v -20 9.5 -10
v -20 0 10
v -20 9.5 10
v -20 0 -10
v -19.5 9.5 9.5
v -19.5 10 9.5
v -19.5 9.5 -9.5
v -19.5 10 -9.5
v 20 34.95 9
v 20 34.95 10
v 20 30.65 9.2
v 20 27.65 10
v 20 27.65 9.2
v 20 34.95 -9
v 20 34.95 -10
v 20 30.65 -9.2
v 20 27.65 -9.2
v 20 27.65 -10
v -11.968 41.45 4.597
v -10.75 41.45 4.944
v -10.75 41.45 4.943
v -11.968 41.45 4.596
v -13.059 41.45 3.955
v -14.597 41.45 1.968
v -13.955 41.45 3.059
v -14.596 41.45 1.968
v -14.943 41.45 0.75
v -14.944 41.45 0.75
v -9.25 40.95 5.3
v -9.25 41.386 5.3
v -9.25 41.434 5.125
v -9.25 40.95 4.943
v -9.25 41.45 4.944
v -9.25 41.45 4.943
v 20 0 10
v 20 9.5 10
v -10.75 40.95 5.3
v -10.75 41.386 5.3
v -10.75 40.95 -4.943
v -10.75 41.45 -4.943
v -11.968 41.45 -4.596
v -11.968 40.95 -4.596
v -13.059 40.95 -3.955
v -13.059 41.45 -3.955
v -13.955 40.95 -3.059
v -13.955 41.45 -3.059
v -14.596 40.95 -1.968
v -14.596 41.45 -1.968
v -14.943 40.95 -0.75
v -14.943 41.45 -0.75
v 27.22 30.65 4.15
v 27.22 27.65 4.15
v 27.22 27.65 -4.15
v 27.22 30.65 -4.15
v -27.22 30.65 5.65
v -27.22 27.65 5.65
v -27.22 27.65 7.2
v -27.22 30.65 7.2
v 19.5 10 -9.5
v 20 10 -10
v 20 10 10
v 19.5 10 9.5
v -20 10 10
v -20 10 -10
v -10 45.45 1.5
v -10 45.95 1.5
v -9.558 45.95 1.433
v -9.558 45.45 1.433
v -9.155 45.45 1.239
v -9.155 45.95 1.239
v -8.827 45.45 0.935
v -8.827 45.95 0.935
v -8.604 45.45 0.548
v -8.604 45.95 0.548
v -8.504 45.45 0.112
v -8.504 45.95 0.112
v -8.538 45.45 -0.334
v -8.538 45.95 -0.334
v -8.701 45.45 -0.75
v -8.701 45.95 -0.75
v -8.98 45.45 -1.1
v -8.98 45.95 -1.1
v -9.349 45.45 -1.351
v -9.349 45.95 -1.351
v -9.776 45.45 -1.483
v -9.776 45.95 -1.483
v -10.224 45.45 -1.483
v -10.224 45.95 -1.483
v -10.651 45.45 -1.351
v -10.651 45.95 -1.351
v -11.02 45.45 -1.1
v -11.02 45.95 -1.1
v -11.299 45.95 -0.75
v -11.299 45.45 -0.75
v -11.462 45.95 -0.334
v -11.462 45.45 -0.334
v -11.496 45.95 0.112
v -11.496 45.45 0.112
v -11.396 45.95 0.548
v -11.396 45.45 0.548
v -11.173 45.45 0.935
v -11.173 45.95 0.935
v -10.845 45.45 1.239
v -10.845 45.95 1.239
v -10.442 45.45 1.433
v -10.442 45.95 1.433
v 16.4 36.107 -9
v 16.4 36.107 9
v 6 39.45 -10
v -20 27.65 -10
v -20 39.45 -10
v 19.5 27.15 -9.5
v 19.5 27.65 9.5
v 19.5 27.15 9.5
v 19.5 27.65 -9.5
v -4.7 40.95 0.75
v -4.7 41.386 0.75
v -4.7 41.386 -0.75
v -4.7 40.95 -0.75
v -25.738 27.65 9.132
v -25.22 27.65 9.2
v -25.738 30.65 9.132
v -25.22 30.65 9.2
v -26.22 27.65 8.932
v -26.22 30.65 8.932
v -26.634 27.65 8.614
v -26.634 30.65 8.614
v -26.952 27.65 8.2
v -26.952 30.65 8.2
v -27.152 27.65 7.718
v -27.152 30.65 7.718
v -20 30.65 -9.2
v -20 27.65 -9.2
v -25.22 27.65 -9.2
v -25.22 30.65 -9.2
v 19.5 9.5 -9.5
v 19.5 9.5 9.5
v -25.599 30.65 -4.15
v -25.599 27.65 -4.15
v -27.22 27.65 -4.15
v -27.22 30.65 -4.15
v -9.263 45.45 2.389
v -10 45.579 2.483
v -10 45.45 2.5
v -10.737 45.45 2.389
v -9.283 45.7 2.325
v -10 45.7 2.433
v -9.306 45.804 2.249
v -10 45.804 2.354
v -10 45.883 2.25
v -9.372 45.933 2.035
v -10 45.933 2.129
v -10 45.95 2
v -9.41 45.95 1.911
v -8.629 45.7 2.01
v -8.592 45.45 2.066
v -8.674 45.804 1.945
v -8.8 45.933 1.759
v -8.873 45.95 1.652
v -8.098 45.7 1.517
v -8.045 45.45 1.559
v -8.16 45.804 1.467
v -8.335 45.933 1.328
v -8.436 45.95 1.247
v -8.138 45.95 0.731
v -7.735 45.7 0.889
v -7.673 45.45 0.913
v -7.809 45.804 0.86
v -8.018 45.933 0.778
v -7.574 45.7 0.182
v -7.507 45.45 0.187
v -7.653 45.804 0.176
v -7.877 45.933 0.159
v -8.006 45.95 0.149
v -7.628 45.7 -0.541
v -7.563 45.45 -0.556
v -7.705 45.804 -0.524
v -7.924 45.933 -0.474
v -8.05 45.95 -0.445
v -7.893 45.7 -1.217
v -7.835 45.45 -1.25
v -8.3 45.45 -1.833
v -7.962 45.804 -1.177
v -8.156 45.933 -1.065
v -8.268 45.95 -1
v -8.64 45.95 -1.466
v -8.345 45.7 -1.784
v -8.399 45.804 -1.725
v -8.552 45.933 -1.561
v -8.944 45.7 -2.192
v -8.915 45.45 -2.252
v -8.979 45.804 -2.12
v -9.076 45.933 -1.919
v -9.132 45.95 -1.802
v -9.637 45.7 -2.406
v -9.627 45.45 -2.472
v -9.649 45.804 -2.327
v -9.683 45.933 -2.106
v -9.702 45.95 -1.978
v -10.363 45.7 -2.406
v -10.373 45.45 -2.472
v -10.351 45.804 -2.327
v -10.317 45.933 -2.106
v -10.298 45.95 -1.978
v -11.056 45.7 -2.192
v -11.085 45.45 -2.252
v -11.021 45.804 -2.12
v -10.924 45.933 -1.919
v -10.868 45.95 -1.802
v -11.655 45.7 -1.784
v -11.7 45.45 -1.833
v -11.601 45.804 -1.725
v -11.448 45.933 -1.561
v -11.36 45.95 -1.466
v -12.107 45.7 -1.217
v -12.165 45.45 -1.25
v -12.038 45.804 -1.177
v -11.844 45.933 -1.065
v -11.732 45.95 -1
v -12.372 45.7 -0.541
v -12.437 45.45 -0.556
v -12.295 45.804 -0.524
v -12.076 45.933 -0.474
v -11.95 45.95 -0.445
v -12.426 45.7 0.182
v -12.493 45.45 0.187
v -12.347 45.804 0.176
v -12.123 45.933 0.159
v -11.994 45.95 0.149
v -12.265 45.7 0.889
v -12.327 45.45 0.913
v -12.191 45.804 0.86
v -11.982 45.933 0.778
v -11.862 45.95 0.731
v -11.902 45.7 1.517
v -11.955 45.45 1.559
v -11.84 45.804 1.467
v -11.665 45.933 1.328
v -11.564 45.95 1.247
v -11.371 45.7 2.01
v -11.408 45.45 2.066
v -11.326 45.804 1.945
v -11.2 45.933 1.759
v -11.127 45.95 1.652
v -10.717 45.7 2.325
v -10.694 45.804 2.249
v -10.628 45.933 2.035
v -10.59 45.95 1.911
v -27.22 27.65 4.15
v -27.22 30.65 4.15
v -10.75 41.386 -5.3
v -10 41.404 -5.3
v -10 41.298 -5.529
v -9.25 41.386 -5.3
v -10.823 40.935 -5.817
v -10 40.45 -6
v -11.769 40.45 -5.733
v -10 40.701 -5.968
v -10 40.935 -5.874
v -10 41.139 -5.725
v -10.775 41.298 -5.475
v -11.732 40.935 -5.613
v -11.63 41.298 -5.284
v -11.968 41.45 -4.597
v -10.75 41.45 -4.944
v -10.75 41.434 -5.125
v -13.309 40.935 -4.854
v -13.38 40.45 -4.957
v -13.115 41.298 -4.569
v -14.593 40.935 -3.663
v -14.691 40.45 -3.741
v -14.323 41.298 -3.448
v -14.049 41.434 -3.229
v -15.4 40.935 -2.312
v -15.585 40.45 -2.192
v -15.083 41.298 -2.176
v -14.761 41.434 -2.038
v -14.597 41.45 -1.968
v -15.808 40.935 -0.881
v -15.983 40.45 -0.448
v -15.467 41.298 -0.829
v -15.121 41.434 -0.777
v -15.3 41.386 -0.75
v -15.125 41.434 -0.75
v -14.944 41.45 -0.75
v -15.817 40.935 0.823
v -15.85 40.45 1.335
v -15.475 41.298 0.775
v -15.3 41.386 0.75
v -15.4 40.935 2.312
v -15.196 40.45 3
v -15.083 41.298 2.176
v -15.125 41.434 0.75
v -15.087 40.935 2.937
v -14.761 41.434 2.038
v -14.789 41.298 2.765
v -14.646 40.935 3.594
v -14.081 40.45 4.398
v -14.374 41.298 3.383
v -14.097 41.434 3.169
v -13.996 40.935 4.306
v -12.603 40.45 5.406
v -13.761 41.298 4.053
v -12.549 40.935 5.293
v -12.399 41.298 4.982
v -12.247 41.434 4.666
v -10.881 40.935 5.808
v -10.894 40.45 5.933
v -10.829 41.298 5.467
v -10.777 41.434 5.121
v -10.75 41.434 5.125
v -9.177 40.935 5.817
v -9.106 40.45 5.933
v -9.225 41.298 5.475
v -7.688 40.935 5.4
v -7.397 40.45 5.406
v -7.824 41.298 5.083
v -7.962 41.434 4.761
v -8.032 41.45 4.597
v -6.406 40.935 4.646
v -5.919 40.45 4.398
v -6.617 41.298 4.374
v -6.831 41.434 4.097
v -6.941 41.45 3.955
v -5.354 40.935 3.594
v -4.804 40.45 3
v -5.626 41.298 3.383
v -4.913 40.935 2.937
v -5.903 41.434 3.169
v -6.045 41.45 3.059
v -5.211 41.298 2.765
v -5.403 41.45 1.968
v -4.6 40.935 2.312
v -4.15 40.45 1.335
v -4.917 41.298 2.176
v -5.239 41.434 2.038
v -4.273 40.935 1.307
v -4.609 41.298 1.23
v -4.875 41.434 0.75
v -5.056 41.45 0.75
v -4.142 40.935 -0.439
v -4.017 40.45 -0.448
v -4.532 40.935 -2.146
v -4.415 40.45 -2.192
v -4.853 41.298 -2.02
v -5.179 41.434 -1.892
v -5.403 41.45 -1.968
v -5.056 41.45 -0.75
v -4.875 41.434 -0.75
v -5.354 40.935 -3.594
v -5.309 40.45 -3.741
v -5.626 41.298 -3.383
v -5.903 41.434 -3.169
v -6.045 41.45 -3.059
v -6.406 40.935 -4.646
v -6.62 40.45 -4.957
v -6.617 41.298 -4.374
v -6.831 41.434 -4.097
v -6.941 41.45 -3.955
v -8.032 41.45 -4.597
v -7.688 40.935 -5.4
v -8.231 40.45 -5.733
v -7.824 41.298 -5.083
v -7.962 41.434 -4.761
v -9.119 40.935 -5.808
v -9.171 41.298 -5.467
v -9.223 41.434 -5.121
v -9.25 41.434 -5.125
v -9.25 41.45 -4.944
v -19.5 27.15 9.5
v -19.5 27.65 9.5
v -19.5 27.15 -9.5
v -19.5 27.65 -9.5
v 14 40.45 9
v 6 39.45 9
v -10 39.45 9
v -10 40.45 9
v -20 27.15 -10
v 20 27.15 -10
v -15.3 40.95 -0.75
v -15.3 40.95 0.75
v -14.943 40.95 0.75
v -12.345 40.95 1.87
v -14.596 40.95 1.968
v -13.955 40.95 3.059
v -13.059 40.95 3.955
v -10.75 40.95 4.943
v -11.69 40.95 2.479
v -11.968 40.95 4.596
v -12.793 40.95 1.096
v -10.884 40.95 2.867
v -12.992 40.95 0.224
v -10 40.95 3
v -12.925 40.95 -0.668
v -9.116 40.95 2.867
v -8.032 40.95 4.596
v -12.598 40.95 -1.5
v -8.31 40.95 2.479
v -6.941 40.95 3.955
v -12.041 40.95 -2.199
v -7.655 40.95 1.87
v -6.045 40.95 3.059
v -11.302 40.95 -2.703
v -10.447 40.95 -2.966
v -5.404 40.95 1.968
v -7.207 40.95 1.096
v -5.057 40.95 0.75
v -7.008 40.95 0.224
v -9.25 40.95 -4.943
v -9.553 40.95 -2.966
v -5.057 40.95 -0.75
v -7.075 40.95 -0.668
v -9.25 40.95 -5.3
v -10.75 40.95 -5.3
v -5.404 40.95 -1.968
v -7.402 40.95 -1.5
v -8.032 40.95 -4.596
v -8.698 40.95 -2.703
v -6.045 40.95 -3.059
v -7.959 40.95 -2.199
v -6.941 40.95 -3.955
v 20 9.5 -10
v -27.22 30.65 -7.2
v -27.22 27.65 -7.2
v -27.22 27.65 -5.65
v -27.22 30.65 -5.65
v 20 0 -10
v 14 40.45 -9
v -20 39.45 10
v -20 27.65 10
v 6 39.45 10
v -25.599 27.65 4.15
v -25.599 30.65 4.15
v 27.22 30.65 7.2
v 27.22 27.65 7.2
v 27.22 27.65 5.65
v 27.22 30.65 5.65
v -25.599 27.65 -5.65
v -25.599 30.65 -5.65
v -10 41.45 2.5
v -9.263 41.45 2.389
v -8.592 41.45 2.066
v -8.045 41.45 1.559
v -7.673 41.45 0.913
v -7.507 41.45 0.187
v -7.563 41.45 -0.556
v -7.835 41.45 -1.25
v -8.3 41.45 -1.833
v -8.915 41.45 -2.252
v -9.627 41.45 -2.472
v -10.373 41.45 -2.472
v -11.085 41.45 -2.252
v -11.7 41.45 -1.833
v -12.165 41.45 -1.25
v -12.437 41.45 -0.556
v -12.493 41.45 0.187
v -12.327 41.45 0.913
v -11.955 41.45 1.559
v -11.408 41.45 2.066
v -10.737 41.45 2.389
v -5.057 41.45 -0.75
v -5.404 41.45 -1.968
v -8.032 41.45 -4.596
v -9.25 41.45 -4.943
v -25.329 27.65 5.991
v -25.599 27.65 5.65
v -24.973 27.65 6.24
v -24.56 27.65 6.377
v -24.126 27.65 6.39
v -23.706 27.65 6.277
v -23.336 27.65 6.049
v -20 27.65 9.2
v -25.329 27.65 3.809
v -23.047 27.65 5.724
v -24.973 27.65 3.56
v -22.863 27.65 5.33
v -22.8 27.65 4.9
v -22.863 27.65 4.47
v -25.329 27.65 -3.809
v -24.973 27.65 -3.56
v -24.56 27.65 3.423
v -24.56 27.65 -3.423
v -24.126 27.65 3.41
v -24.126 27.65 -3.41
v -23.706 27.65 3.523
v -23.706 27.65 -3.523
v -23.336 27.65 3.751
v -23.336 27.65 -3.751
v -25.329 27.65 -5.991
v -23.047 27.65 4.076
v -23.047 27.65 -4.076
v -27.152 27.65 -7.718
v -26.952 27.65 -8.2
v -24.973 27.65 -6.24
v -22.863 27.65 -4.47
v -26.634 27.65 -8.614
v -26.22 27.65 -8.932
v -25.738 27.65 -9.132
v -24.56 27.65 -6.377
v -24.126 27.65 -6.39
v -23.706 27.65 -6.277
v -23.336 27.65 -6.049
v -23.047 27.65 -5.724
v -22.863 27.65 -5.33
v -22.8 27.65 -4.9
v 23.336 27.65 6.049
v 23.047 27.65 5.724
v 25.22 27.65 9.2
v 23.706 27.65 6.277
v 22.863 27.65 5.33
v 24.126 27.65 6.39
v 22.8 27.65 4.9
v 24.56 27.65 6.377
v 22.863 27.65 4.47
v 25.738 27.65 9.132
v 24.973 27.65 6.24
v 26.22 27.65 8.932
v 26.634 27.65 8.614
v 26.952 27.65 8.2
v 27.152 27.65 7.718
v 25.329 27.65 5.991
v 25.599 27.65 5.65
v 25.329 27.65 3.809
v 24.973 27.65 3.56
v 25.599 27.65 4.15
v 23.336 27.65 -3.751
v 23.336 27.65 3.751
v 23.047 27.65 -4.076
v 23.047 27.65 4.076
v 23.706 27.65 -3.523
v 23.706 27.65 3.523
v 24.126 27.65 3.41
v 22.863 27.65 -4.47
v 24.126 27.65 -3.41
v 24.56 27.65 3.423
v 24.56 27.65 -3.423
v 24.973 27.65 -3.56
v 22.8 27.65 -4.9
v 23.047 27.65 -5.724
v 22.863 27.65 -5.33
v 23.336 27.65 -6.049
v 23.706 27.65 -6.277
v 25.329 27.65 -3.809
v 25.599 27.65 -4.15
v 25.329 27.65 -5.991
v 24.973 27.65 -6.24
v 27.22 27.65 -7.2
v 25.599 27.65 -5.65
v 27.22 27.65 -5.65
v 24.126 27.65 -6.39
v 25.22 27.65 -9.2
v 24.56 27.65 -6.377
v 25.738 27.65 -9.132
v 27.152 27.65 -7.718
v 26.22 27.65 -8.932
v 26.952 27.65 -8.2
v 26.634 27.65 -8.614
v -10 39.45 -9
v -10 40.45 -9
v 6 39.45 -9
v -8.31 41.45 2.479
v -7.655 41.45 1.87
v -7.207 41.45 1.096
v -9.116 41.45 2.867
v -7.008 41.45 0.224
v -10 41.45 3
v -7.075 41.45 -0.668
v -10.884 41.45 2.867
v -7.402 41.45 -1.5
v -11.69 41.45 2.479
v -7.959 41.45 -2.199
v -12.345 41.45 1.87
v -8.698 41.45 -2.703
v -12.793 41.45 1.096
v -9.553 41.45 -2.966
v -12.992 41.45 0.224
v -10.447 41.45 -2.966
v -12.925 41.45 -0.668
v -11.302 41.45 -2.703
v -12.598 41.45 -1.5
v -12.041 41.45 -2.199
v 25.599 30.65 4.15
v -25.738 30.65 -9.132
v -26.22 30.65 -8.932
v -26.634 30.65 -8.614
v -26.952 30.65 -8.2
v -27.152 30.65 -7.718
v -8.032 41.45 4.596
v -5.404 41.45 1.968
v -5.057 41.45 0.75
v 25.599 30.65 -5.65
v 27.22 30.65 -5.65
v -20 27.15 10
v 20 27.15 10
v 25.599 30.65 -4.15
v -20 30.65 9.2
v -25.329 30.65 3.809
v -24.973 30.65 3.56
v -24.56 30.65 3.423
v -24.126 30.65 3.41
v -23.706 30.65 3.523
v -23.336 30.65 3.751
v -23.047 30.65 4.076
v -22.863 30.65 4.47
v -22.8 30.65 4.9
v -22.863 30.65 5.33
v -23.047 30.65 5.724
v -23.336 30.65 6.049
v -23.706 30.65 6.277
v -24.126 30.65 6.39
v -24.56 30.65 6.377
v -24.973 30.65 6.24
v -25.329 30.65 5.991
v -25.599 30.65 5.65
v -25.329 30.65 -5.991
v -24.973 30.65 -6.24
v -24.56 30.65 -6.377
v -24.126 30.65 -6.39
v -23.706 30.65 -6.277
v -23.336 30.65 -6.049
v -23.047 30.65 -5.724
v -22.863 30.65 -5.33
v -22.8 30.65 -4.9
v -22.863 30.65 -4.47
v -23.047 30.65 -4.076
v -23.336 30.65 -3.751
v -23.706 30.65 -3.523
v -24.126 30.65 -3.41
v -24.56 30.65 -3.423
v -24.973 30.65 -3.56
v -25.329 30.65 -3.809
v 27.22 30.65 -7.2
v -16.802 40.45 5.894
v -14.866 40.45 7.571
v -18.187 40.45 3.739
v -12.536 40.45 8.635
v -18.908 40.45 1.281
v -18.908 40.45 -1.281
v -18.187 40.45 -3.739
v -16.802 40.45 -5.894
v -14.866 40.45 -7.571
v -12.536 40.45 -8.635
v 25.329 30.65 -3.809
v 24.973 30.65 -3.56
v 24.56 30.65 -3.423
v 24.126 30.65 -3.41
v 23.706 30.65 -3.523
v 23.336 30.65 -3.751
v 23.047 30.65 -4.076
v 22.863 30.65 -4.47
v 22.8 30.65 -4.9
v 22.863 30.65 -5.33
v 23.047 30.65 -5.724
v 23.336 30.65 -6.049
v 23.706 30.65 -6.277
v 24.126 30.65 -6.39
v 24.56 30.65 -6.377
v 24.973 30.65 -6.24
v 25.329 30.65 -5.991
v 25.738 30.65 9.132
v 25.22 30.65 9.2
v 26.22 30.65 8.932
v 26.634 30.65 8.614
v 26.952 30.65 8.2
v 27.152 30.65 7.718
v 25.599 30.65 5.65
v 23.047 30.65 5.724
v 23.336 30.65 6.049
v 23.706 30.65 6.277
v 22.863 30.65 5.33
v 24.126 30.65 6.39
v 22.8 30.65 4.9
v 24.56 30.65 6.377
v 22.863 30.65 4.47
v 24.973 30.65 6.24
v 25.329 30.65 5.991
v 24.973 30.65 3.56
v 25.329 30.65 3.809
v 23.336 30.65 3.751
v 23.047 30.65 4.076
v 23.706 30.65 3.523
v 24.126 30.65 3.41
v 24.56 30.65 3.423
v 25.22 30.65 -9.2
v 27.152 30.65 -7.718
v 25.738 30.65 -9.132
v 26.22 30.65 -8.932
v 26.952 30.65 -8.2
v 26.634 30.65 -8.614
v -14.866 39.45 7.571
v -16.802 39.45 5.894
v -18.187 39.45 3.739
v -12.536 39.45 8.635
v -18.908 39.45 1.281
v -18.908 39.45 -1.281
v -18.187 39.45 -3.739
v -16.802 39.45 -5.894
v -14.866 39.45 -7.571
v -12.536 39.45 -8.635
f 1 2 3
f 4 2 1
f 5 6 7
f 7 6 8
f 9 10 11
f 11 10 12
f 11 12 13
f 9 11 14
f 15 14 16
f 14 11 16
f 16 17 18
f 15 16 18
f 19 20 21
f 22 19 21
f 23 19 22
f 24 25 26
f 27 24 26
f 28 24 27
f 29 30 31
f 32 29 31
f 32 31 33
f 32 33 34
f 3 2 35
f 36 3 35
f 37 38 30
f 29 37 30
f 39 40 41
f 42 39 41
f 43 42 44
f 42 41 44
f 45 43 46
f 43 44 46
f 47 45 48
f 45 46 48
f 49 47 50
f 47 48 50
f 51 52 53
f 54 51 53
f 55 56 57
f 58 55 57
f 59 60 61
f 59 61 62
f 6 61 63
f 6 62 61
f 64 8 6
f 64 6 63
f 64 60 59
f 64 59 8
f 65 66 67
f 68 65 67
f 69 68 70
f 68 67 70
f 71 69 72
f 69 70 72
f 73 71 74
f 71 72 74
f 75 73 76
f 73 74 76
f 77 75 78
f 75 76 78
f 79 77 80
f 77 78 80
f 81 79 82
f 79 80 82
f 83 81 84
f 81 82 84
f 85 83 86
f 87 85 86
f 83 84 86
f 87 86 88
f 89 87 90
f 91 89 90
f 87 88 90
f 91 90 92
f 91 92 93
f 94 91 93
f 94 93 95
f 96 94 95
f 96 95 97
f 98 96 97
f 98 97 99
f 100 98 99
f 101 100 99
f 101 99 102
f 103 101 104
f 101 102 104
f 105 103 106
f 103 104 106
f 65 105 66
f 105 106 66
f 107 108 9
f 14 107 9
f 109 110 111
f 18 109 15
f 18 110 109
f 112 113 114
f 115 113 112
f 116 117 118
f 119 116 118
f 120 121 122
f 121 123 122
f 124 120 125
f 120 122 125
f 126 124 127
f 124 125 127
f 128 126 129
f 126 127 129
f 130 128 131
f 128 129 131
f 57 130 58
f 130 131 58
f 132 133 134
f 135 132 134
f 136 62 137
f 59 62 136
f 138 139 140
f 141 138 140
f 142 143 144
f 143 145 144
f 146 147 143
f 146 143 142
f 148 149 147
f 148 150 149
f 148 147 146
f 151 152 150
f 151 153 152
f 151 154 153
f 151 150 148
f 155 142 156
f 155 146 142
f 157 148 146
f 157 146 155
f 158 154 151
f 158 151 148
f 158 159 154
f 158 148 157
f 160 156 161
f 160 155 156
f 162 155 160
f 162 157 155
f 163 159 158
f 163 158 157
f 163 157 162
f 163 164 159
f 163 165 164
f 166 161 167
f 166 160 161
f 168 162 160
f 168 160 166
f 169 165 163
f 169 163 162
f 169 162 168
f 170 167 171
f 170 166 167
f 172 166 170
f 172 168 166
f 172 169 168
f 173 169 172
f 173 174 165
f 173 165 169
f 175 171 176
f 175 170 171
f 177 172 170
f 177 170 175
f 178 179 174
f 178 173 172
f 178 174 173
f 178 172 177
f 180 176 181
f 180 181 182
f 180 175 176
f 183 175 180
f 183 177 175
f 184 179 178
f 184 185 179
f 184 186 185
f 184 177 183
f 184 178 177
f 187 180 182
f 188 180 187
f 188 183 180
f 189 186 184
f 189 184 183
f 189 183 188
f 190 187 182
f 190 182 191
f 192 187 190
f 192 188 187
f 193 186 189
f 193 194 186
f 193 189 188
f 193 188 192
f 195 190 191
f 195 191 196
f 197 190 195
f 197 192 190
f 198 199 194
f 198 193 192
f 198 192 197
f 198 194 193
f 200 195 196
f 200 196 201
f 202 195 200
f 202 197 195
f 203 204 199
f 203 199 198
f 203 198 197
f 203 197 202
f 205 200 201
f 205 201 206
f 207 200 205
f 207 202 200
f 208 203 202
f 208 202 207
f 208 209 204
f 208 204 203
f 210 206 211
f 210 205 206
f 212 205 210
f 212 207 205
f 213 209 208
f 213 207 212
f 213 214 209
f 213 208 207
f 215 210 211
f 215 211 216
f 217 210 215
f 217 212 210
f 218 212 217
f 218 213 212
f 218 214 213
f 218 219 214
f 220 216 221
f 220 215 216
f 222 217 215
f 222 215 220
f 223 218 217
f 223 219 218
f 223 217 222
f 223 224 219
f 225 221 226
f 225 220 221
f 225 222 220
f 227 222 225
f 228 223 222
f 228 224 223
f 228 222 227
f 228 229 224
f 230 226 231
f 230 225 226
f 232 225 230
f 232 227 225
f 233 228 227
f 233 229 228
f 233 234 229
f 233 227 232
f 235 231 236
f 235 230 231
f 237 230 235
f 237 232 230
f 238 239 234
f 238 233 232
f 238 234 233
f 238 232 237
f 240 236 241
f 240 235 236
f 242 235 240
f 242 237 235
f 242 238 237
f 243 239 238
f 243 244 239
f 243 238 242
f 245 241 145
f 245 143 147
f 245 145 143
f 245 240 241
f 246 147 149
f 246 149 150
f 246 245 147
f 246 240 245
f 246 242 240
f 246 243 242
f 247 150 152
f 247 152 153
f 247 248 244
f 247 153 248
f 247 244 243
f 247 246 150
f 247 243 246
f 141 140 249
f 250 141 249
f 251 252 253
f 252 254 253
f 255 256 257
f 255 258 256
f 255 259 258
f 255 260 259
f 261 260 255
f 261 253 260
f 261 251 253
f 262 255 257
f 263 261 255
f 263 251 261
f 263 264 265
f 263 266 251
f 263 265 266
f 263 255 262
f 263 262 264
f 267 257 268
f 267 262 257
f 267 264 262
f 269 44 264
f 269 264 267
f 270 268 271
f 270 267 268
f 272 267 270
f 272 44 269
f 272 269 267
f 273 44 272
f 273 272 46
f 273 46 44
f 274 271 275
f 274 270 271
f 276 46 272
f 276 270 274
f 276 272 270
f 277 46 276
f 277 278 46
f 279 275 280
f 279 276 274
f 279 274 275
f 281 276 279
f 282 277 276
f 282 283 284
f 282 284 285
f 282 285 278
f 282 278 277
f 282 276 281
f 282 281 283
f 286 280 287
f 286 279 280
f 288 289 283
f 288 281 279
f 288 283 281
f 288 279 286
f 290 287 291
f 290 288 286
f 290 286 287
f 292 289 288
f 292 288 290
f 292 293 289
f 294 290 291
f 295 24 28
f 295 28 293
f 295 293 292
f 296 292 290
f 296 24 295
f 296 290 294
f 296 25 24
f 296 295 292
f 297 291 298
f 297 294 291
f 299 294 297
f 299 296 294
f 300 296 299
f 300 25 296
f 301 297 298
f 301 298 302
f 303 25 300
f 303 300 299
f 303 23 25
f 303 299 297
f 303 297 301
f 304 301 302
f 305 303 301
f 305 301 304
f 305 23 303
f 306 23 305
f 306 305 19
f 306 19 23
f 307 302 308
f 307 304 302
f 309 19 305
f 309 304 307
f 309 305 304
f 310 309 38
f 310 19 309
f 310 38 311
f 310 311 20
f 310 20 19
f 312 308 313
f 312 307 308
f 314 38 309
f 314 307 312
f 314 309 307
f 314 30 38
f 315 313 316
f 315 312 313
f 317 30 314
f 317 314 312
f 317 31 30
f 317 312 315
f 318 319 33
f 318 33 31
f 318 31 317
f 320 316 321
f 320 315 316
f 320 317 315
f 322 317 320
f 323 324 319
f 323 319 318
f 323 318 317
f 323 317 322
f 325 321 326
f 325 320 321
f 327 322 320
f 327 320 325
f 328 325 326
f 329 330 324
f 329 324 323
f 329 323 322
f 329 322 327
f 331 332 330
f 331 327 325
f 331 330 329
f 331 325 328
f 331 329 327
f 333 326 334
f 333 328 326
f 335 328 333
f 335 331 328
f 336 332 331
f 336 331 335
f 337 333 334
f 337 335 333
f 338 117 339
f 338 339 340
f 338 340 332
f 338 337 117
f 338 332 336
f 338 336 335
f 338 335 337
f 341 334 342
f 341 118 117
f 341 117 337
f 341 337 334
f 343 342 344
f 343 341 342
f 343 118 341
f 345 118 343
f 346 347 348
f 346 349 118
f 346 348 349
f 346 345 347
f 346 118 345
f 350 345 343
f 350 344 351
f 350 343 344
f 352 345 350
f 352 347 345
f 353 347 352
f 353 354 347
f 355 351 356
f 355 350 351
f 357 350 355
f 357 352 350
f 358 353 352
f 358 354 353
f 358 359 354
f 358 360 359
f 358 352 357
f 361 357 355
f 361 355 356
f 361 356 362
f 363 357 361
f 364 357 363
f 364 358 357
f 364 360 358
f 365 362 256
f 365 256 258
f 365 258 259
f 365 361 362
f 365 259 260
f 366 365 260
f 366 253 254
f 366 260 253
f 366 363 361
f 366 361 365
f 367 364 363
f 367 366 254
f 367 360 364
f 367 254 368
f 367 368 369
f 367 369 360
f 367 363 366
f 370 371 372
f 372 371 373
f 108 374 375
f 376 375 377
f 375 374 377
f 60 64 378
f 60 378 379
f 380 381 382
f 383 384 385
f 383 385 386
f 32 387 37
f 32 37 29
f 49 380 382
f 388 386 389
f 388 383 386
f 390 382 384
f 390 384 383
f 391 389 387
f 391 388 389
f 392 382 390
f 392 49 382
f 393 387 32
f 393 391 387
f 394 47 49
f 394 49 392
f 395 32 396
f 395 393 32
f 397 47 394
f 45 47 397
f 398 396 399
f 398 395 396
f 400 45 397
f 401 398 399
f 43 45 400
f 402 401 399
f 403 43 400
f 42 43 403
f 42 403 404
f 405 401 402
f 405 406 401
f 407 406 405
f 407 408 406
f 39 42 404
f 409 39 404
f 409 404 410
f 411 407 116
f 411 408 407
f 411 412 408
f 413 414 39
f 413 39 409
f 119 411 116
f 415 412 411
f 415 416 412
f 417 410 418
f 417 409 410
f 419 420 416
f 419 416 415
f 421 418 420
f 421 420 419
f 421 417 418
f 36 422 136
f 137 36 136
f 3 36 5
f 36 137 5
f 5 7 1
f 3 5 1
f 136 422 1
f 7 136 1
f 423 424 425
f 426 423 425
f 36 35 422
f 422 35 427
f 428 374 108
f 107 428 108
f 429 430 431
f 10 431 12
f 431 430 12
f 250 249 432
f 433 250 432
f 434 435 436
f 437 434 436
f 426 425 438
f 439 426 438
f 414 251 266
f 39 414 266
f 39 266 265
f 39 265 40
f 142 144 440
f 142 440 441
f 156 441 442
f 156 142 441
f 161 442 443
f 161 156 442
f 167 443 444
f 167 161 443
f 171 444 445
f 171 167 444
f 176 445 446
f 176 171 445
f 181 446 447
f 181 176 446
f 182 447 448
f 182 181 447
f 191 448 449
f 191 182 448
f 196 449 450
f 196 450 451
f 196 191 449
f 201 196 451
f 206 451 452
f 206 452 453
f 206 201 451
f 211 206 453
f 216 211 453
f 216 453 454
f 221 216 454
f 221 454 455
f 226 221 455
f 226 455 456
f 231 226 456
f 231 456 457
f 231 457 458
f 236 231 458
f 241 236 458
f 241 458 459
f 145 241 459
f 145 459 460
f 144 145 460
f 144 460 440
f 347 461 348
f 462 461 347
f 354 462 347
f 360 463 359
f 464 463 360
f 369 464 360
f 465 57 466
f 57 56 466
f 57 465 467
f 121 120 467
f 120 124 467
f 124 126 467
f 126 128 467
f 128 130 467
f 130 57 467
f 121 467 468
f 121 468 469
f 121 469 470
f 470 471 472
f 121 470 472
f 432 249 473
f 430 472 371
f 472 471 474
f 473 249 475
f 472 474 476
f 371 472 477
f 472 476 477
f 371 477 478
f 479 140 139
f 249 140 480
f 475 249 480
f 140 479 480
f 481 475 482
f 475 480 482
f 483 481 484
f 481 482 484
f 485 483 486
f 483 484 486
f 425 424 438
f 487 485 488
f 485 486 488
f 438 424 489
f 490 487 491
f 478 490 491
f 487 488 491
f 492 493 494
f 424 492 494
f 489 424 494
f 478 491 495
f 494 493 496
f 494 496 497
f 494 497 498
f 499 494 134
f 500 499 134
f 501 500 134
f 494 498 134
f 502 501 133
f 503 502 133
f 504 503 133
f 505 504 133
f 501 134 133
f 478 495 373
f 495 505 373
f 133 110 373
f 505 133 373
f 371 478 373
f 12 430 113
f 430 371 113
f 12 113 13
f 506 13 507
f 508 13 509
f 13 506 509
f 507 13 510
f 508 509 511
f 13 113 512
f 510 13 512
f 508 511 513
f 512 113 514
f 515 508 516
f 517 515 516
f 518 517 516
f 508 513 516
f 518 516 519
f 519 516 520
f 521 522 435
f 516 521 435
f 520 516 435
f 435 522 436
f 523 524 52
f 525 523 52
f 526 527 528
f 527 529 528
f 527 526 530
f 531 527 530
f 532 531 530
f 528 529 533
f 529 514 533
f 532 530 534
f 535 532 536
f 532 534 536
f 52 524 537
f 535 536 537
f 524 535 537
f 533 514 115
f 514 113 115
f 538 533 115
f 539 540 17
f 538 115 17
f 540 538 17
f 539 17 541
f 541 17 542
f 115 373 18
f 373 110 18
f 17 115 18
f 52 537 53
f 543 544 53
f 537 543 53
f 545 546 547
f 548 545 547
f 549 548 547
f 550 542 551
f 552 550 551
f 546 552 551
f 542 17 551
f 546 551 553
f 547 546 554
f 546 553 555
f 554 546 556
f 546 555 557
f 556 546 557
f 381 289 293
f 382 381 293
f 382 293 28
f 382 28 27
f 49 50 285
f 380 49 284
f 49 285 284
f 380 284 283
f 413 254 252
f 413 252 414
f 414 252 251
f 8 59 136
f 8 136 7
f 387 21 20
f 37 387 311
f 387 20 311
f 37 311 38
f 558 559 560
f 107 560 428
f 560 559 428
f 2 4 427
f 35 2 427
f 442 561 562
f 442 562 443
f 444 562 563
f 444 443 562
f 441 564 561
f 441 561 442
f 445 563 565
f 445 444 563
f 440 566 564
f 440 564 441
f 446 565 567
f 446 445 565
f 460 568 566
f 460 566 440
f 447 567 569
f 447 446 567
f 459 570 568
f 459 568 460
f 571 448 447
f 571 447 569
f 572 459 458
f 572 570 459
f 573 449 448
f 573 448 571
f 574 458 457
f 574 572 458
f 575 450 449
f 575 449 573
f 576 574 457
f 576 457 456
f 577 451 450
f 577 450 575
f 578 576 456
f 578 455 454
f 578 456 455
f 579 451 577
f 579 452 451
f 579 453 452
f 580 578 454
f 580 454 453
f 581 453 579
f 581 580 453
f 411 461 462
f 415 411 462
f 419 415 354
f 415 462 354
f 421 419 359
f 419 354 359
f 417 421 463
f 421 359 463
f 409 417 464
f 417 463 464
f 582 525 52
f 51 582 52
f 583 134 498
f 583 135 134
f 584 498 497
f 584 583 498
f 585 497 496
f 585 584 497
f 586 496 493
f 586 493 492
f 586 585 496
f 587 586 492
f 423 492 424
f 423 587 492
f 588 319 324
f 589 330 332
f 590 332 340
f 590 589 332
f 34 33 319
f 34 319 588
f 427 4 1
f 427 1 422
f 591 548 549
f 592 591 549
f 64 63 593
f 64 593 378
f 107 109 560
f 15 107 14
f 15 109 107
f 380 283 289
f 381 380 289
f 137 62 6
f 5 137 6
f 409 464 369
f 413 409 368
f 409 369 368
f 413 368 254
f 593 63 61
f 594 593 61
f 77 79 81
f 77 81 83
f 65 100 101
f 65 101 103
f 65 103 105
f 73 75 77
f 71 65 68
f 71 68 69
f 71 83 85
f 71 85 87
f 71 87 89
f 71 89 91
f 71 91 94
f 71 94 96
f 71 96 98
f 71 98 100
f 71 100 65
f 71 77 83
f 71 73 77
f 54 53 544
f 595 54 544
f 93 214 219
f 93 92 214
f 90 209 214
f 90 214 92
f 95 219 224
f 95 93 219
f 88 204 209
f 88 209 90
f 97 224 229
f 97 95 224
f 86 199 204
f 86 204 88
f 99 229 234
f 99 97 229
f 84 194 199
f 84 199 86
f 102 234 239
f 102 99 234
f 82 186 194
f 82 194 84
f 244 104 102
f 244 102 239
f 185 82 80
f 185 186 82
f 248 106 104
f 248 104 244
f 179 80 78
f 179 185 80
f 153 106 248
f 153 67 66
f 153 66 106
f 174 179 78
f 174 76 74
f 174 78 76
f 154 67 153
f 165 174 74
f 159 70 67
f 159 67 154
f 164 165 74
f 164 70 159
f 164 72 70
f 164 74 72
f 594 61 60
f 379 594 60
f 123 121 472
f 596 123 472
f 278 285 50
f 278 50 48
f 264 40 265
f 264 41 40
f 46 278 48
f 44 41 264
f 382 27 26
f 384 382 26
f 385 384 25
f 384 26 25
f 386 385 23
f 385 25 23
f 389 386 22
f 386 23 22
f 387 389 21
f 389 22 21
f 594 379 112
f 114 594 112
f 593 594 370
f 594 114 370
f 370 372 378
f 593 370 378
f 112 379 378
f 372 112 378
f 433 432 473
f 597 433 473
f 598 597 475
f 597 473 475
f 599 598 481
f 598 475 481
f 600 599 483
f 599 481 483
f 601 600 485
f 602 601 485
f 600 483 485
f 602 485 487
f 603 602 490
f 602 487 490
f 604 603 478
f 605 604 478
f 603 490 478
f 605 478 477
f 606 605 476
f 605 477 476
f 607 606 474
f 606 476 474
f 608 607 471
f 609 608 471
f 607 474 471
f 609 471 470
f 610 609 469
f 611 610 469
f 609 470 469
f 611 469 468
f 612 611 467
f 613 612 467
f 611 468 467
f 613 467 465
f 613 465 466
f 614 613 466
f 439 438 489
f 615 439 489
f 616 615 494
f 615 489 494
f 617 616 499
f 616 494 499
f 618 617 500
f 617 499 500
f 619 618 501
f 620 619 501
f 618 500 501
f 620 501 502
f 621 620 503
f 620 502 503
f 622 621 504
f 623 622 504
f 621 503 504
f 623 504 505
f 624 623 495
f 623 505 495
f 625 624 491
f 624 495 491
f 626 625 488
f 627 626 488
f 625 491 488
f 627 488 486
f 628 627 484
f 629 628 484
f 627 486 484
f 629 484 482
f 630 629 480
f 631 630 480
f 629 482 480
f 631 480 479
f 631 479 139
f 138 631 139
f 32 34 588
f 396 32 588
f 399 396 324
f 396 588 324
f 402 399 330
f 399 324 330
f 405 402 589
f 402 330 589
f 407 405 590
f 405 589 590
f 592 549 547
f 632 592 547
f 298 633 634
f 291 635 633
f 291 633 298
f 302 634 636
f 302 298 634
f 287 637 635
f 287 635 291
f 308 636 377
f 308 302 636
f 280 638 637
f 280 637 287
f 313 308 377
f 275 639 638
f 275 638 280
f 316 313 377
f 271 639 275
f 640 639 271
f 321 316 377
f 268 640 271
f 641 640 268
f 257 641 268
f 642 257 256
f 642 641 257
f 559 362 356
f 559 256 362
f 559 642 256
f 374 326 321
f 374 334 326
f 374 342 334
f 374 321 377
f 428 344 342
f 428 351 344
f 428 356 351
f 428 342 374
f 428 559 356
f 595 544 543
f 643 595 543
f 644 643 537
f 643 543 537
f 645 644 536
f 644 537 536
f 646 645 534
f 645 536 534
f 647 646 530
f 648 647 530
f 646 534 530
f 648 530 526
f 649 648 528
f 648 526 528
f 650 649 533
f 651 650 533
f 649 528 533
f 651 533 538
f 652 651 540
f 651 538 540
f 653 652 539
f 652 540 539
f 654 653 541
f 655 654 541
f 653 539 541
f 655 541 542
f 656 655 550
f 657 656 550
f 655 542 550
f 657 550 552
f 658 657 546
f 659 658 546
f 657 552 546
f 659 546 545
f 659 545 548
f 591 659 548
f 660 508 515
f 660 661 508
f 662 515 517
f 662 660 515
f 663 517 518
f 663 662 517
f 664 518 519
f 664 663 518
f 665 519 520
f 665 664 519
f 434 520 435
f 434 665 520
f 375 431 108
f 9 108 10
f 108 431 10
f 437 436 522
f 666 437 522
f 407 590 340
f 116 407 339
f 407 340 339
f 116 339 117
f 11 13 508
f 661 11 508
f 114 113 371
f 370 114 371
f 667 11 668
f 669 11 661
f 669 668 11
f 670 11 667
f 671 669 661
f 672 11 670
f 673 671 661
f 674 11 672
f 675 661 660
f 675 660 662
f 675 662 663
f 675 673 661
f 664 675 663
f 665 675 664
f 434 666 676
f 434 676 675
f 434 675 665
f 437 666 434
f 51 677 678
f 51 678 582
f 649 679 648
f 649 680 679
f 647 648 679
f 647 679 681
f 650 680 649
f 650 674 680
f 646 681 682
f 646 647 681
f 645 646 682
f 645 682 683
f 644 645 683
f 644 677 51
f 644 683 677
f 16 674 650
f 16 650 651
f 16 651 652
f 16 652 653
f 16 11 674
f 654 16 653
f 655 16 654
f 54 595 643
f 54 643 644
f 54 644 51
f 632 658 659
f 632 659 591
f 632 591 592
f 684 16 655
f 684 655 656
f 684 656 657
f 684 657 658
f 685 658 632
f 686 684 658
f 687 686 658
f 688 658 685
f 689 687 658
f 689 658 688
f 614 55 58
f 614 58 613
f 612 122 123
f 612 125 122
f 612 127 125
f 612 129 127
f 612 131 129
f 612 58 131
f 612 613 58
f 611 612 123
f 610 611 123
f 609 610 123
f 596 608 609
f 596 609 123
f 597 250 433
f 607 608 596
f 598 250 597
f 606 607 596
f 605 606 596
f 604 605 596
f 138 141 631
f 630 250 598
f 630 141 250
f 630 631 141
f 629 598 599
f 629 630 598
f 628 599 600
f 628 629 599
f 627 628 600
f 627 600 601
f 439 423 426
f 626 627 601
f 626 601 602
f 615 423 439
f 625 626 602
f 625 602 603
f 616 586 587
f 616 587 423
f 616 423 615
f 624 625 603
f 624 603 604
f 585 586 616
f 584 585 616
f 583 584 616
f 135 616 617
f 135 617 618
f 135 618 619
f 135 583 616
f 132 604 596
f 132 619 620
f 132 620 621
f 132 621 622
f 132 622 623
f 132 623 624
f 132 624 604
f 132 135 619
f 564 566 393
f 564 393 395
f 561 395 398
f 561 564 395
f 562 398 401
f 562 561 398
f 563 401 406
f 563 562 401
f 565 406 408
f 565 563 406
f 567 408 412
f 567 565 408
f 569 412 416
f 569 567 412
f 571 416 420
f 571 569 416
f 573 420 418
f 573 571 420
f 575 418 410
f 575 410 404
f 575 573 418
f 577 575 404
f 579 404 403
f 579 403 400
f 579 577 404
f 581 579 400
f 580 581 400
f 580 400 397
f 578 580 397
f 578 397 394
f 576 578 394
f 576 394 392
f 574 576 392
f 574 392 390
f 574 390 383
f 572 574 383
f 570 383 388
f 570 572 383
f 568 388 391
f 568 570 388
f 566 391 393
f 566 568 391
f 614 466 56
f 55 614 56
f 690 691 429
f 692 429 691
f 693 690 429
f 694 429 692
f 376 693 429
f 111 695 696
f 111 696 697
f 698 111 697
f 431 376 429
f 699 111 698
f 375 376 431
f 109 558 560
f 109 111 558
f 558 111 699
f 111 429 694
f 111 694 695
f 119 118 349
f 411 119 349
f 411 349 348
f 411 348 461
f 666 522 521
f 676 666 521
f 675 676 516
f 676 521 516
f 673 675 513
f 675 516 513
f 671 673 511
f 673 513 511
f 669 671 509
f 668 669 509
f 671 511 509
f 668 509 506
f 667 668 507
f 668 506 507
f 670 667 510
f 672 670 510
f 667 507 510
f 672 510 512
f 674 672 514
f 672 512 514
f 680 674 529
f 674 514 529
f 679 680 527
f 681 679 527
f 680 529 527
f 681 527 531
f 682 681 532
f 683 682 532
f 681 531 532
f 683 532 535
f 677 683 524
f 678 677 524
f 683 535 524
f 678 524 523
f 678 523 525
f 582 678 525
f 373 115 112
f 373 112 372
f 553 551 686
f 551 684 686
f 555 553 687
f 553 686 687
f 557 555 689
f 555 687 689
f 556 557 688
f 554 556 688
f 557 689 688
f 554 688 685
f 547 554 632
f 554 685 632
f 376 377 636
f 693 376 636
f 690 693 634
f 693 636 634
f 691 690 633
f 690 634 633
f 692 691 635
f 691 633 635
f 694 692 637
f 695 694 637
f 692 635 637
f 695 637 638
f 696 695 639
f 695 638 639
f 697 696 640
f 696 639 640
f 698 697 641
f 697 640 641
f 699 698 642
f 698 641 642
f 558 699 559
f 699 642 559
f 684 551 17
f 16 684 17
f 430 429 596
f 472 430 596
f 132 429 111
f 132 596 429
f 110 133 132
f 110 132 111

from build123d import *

# Parameters (mm, degrees)
SKETCH_1_W          = 40
SKETCH_1_H          = 20
EXTRUDE_1_DEPTH     = 40.45
EXTRUDE_2_DEPTH     = 3
FILLET_1_R          = 2
SKETCH_4_W          = 40
SKETCH_4_H          = 20
SKETCH_4_W_2        = 39
SKETCH_4_H_2        = 19
CUT_EXTRUDE_2_DEPTH = 0.5
SKETCH_5_W          = 40
SKETCH_5_H          = 20
SKETCH_5_W_2        = 39
SKETCH_5_H_2        = 19
CUT_EXTRUDE_3_DEPTH = 0.5
SKETCH_6_R          = 6
EXTRUDE_3_DEPTH     = 1
FILLET_2_R          = 1
SKETCH_7_R          = 5
SKETCH_7_R_2        = 3
SKETCH_7_R_3        = 2.5
CUT_EXTRUDE_4_DEPTH = 0.5
CUT_EXTRUDE_6_DEPTH = 1
CUT_EXTRUDE_7_DEPTH = 1
CUT_EXTRUDE_8_DEPTH = 54.103963207
EXTRUDE_START       = 5
SKETCH_11_R         = 2.5
EXTRUDE_4_DEPTH     = 5
SKETCH_12_R         = 1.5
CUT_EXTRUDE_9_DEPTH = 0.5
FILLET_3_R          = 0.5


with BuildPart() as part:
    # 草图1 → 凸台-拉伸1 (new body)
    with BuildSketch(Plane(origin=(0, 0, 0), x_dir=(1, 0, 0), z_dir=(0, 1, 0))):
        Rectangle(SKETCH_1_W, SKETCH_1_H)
    extrude(amount=EXTRUDE_1_DEPTH)

    # 草图2 → 凸台-拉伸2 (add)
    with BuildSketch(Plane(origin=(0, 27.65, 0), x_dir=(-1, 0, 0), z_dir=(0, -1, 0))):
        with BuildLine():
            Line((20, 9.2), (27.22, 9.2))
            Line((27.22, 9.2), (27.22, 5.65))
            Line((27.22, 5.65), (25.599038106, 5.65))
            ThreePointArc((25.599038106, 5.65), (22.8, 4.9), (25.599038106, 4.15))
            Line((25.599038106, 4.15), (27.22, 4.15))
            Line((27.22, 4.15), (27.22, -4.15))
            Line((27.22, -4.15), (25.599038106, -4.15))
            ThreePointArc((25.599038106, -4.15), (22.8, -4.9), (25.599038106, -5.65))
            Line((25.599038106, -5.65), (27.22, -5.65))
            Line((27.22, -5.65), (27.22, -9.2))
            Line((27.22, -9.2), (20, -9.2))
            Line((20, -9.2), (20, 9.2))
        make_face()
        with BuildLine():
            Line((-20, 9.2), (-20, -9.2))
            Line((-20, -9.2), (-27.22, -9.2))
            Line((-27.22, -9.2), (-27.22, -5.65))
            Line((-27.22, -5.65), (-25.599038106, -5.65))
            ThreePointArc((-25.599038106, -5.65), (-22.8, -4.9), (-25.599038106, -4.15))
            Line((-25.599038106, -4.15), (-27.22, -4.15))
            Line((-27.22, -4.15), (-27.22, 4.15))
            Line((-27.22, 4.15), (-25.599038106, 4.15))
            ThreePointArc((-25.599038106, 4.15), (-22.8, 4.9), (-25.599038106, 5.65))
            Line((-25.599038106, 5.65), (-27.22, 5.65))
            Line((-27.22, 5.65), (-27.22, 9.2))
            Line((-27.22, 9.2), (-20, 9.2))
        make_face()
    extrude(amount=-EXTRUDE_2_DEPTH)

    # 圆角1
    fillet_1_edges = [part.edges().sort_by_distance(p)[0] for p in [
        (-27.22, 29.15, -9.2),
        (-27.22, 29.15, 9.2),
        (27.22, 29.15, -9.2),
        (27.22, 29.15, 9.2),
    ]]
    fillet(fillet_1_edges, radius=FILLET_1_R)

    # 草图4 → 切除-拉伸2 (cut)
    with BuildSketch(Plane(origin=(0, 27.65, 0), x_dir=(-1, 0, 0), z_dir=(0, -1, 0))):
        Rectangle(SKETCH_4_W, SKETCH_4_H)
        Rectangle(SKETCH_4_W_2, SKETCH_4_H_2, mode=Mode.SUBTRACT)
    extrude(amount=CUT_EXTRUDE_2_DEPTH, mode=Mode.SUBTRACT)

    # 草图5 → 切除-拉伸3 (cut)
    with BuildSketch(Plane(origin=(0, 10, 0), x_dir=(-1, 0, 0), z_dir=(0, -1, 0))):
        Rectangle(SKETCH_5_W, SKETCH_5_H)
        Rectangle(SKETCH_5_W_2, SKETCH_5_H_2, mode=Mode.SUBTRACT)
    extrude(amount=CUT_EXTRUDE_3_DEPTH, mode=Mode.SUBTRACT)

    # 草图6 → 凸台-拉伸3 (add)
    with BuildSketch(Plane(origin=(0, 40.45, 0), x_dir=(1, 0, 0), z_dir=(0, 1, 0))):
        with Locations(Location((-10, 0, 0), (0, 0, 90))):
            Circle(SKETCH_6_R)
    extrude(amount=EXTRUDE_3_DEPTH)

    # 圆角2
    fillet_2_edges = [part.edges().sort_by_distance(p)[0] for p in [
        (-10, 41.45, 6),
    ]]
    fillet(fillet_2_edges, radius=FILLET_2_R - 0.0001)  # a hair under: the kernel refuses the full size

    # 草图7 → 切除-拉伸4 (cut)
    # profile 1 of 6: a face of its own
    with BuildSketch(Plane(origin=(0, 41.45, 0), x_dir=(1, 0, 0), z_dir=(0, 1, 0))):
        with Locations((-10, 0)):
            Circle(SKETCH_7_R)
        with Locations(Location((-10, 0, 0), (0, 0, 270))):
            Circle(SKETCH_7_R_2, mode=Mode.SUBTRACT)
    # profile 2 of 6: a face of its own
    with BuildSketch(Plane(origin=(0, 41.45, 0), x_dir=(1, 0, 0), z_dir=(0, 1, 0))):
        with BuildLine():
            Line((-14.943429983, 0.75), (-15.3, 0.75))
            Line((-15.3, 0.75), (-15.3, -0.75))
            Line((-15.3, -0.75), (-14.943429983, -0.75))
            ThreePointArc((-14.943429983, -0.75), (-15, 0), (-14.943429983, 0.75))
        make_face()
    # profile 3 of 6: a face of its own
    with BuildSketch(Plane(origin=(0, 41.45, 0), x_dir=(1, 0, 0), z_dir=(0, 1, 0))):
        with BuildLine():
            ThreePointArc((-9.25, -4.943429983), (-10, -5), (-10.75, -4.943429983))
            Line((-10.75, -4.943429983), (-10.75, -5.3))
            Line((-10.75, -5.3), (-9.25, -5.3))
            Line((-9.25, -5.3), (-9.25, -4.943429983))
        make_face()
    # profile 4 of 6: a face of its own
    with BuildSketch(Plane(origin=(0, 41.45, 0), x_dir=(1, 0, 0), z_dir=(0, 1, 0))):
        with BuildLine():
            Line((-4.7, 0.75), (-5.056570017, 0.75))
            ThreePointArc((-5.056570017, 0.75), (-5.014162562, 0.376065209), (-5, 0))
            ThreePointArc((-5, 0), (-5.014162562, -0.376065209), (-5.056570017, -0.75))
            Line((-5.056570017, -0.75), (-4.7, -0.75))
            Line((-4.7, -0.75), (-4.7, 0.75))
        make_face()
    # profile 5 of 6: a face of its own
    with BuildSketch(Plane(origin=(0, 41.45, 0), x_dir=(1, 0, 0), z_dir=(0, 1, 0))):
        with BuildLine():
            Line((-10.75, 5.3), (-10.75, 4.943429983))
            ThreePointArc((-10.75, 4.943429983), (-10, 5), (-9.25, 4.943429983))
            Line((-9.25, 4.943429983), (-9.25, 5.3))
            Line((-9.25, 5.3), (-10.75, 5.3))
        make_face()
    # profile 6 of 6: a face of its own
    with BuildSketch(Plane(origin=(0, 41.45, 0), x_dir=(1, 0, 0), z_dir=(0, 1, 0))):
        with Locations(Location((-10, 0, 0), (0, 0, 270))):
            Circle(SKETCH_7_R_3)
    extrude(amount=-CUT_EXTRUDE_4_DEPTH, mode=Mode.SUBTRACT)

    # 草图8 → 切除-拉伸6 (cut)
    with BuildSketch(Plane(origin=(0, 40.45, 0), x_dir=(1, 0, 0), z_dir=(0, 1, 0))):
        with BuildLine():
            Line((-10, 9), (20, 9))
            Line((20, 9), (20, 10))
            Line((20, 10), (-20, 10))
            Line((-20, 10), (-20, -10))
            Line((-20, -10), (20, -10))
            Line((20, -10), (20, -9))
            Line((20, -9), (-10, -9))
            ThreePointArc((-10, -9), (-19, 0), (-10, 9))
        make_face()
    extrude(amount=-CUT_EXTRUDE_6_DEPTH, mode=Mode.SUBTRACT)

    # 草图9 → 切除-拉伸7 (cut)
    with BuildSketch(Plane.XY.offset(10)):
        Polygon((6, 39.45), (20, 34.95), (20, 39.45), align=None)
    cut_extrude_7 = extrude(amount=-CUT_EXTRUDE_7_DEPTH, mode=Mode.SUBTRACT)

    # 镜向1: 切除-拉伸7 across plane
    add(cut_extrude_7.mirror(Plane.XY), mode=Mode.SUBTRACT)

    # 草图10 → 切除-拉伸8 (cut, through all)
    with BuildSketch(Plane.XY.offset(9)):
        Polygon((14, 40.45), (16.4, 36.107142857), (20, 34.95), (20, 40.45), align=None)
    extrude(amount=-CUT_EXTRUDE_8_DEPTH, mode=Mode.SUBTRACT)

    # 草图11 → 凸台-拉伸4 (add)
    with BuildSketch(Plane(origin=(0, 40.95, 0), x_dir=(1, 0, 0), z_dir=(0, 1, 0)).offset(EXTRUDE_START)):
        with Locations(Location((-10, 0, 0), (0, 0, 270))):
            Circle(SKETCH_11_R)
    extrude(amount=-EXTRUDE_4_DEPTH)

    # 草图12 → 切除-拉伸9 (cut)
    with BuildSketch(Plane(origin=(0, 45.95, 0), x_dir=(1, 0, 0), z_dir=(0, 1, 0))):
        with Locations(Location((-10, 0, 0), (0, 0, 270))):
            Circle(SKETCH_12_R)
    extrude(amount=-CUT_EXTRUDE_9_DEPTH, mode=Mode.SUBTRACT)

    # 圆角3
    fillet_3_edges = [part.edges().sort_by_distance(p)[0] for p in [
        (-10, 45.95, -2.5),
    ]]
    fillet(fillet_3_edges, radius=FILLET_3_R)


solid = part.part
